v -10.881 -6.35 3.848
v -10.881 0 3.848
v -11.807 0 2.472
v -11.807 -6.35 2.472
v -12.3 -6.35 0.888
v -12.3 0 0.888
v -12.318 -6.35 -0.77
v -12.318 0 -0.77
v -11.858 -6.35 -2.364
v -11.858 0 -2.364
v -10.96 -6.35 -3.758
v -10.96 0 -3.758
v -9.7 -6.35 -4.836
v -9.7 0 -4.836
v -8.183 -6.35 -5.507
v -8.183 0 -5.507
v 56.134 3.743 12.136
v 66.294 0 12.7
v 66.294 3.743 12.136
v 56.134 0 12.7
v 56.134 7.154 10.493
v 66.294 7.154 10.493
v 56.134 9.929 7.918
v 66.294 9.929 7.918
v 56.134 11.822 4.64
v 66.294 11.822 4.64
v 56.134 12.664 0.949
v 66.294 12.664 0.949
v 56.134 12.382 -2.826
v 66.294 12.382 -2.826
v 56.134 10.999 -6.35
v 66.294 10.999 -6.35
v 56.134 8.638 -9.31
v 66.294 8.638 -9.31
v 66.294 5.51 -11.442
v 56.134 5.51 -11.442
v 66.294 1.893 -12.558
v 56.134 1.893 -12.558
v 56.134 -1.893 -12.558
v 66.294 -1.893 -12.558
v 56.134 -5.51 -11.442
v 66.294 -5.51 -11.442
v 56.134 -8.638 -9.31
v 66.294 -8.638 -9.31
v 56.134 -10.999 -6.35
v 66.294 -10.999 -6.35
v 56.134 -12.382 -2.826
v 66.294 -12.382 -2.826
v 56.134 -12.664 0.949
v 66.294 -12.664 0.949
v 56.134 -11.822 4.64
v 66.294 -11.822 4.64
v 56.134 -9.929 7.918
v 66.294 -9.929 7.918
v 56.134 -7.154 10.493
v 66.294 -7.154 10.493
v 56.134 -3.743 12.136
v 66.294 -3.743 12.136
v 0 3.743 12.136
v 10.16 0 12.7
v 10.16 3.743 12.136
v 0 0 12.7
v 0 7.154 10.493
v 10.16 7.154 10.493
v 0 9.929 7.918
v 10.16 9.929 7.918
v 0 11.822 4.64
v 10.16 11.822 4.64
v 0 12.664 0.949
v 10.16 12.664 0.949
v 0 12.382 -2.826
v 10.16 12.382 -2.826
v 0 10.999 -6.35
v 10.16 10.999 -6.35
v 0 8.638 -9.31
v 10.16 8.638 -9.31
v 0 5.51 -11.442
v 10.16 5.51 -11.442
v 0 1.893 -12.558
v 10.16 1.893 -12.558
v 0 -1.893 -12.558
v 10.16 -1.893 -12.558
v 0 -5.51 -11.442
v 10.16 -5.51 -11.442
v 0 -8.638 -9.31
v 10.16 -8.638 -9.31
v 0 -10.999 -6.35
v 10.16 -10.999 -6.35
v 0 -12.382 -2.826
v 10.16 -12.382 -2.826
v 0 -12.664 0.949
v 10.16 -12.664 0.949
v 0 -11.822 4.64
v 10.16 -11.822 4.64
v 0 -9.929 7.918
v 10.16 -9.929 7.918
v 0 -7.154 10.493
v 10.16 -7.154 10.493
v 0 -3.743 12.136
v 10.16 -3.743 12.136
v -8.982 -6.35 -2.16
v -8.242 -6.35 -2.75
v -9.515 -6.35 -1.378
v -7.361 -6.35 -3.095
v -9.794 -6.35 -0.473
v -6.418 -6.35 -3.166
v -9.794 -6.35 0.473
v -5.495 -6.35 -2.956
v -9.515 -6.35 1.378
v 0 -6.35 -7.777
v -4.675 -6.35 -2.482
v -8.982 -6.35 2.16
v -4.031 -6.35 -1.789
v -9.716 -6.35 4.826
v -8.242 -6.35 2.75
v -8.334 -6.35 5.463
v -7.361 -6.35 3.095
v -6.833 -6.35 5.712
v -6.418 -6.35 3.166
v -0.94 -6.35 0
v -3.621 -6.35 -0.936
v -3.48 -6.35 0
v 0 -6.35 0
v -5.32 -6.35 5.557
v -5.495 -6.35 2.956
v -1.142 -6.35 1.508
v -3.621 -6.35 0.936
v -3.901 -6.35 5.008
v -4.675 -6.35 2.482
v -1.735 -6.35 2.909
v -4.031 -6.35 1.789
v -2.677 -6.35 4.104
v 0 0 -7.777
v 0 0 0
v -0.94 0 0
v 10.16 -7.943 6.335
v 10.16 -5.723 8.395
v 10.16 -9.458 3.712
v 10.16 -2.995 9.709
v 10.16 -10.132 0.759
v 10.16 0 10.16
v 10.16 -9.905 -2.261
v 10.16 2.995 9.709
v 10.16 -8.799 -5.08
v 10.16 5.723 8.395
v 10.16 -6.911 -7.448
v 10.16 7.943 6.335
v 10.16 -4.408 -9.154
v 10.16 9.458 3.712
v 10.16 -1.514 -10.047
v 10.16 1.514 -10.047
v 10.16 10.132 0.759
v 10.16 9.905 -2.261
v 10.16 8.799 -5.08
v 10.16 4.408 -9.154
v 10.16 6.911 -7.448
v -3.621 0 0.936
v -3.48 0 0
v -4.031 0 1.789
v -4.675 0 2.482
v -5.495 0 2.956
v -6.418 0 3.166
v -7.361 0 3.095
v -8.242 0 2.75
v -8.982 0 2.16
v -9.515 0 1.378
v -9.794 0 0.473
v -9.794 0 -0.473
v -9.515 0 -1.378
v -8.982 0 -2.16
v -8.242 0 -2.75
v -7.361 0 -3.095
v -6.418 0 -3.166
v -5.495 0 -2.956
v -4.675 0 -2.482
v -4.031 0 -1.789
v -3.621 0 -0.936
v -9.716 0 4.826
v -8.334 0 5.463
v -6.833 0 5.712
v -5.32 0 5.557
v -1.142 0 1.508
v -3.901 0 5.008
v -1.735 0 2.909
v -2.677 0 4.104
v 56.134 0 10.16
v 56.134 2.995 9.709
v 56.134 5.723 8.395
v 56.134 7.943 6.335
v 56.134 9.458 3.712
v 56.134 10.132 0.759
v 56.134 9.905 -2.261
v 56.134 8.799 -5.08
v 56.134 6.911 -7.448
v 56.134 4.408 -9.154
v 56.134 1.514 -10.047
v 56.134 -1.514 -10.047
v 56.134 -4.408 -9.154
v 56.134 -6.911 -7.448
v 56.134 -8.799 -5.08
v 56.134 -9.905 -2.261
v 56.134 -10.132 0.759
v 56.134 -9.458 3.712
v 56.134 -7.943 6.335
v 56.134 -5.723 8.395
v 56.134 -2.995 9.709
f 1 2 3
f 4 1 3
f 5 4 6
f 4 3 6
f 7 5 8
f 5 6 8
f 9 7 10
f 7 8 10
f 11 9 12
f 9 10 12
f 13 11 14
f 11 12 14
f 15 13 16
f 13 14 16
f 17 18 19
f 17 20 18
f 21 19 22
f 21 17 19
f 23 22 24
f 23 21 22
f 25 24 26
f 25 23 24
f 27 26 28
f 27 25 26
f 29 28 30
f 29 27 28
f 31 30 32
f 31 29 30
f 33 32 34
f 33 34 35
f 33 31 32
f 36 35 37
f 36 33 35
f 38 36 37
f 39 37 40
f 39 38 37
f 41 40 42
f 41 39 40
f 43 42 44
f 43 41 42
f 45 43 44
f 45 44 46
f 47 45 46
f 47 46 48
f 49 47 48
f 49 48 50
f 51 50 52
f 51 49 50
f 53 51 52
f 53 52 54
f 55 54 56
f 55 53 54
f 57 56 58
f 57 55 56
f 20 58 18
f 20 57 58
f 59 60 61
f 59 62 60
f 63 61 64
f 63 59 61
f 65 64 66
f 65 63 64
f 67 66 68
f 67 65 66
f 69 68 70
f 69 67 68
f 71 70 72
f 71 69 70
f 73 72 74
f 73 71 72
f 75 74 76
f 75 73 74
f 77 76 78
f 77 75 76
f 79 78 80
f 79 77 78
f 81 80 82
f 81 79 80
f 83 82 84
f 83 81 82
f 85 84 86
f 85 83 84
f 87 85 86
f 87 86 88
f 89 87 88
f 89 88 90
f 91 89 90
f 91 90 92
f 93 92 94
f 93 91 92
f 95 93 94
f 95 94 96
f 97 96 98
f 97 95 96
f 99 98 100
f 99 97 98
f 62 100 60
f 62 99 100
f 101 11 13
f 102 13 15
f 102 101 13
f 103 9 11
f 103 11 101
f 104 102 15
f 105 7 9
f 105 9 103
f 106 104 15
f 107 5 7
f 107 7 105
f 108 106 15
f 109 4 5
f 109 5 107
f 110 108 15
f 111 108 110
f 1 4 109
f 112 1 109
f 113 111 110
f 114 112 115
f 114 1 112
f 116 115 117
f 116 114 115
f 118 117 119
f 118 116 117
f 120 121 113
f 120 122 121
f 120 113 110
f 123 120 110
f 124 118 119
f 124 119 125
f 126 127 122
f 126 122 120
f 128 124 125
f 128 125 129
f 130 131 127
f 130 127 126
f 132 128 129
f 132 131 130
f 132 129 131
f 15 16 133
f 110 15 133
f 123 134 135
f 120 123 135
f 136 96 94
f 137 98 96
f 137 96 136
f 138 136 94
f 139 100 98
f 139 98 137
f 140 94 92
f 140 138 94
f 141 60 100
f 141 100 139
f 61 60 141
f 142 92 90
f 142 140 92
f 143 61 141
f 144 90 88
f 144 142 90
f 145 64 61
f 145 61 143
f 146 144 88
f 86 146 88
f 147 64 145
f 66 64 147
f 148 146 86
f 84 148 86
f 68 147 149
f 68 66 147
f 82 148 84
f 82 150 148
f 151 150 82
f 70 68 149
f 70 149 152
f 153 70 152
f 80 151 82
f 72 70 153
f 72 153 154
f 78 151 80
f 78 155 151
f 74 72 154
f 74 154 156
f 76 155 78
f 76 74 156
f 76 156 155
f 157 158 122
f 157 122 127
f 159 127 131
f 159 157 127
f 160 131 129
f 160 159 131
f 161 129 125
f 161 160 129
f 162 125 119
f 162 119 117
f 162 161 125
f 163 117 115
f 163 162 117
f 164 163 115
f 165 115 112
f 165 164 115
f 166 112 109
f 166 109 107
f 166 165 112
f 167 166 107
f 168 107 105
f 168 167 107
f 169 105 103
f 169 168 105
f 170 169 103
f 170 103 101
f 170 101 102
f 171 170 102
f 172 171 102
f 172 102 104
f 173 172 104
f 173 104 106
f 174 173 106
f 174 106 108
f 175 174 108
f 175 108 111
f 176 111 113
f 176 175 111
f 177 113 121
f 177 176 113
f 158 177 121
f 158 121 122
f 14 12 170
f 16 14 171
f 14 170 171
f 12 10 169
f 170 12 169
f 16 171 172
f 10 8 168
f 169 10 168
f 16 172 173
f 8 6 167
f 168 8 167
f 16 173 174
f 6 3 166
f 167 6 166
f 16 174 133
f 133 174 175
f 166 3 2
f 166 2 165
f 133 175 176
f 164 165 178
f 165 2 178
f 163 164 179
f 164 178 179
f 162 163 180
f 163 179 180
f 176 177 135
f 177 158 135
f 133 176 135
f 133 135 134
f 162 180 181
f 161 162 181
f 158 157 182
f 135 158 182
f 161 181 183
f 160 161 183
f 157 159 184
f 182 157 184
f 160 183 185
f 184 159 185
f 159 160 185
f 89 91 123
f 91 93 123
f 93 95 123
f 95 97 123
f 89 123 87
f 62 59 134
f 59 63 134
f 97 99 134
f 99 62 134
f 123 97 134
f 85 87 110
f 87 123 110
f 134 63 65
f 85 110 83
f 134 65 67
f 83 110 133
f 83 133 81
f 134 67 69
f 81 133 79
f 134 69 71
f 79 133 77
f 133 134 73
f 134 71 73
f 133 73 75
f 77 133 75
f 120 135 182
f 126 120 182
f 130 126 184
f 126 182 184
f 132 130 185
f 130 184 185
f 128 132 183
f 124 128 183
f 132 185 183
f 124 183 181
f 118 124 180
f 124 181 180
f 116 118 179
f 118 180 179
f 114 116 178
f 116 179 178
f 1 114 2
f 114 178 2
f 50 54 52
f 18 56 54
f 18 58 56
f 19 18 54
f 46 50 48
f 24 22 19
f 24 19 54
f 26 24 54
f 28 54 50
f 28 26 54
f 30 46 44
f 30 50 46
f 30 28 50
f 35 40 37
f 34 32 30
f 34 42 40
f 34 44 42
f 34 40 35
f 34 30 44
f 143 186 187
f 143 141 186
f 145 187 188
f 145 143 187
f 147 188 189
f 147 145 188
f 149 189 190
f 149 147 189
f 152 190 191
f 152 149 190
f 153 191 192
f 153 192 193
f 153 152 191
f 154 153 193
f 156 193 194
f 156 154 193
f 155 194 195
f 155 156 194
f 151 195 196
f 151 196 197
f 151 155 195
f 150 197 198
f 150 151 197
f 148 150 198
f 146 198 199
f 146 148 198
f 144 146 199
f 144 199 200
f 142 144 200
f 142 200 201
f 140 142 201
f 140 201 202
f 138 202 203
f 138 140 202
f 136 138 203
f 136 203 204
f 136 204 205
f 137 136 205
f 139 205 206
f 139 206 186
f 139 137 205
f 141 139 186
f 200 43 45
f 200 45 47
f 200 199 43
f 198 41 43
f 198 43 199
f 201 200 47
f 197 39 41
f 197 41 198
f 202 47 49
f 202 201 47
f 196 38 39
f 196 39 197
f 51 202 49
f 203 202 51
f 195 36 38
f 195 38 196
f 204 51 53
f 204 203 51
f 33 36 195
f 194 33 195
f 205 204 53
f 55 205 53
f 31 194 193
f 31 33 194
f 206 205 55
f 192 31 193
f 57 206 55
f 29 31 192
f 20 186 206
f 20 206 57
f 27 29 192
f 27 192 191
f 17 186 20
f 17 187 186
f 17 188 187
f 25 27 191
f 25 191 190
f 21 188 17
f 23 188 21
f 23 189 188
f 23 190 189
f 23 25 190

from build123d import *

# Parameters (mm, degrees)
F0_W     = 5.842
F0_H     = 12.7
F0_R     = 3.175
F3_DEPTH = 6.35


with BuildPart() as f1:
    # F0 (on Front) → F1 (revolve)
    with BuildSketch(Plane.XZ):
        with Locations((2.921, 6.35)):
            Rectangle(F0_W, F0_H)
    revolve(axis=Axis((33.147, 0, 0), (-1, 0, 0)))

    # F0 (on Front) → F2 (revolve)
    with BuildSketch(Plane.XZ):
        Polygon((5.842, 12.7), (5.842, 0), (66.294, 0), (66.294, 12.7), (56.134, 12.7), (56.134, 10.16), (10.16, 10.16), (10.16, 12.7), align=None)
    revolve(axis=Axis((33.147, 0, 0), (-1, 0, 0)))

    # F0 (on Front) → F3 (join)
    with BuildSketch(Plane.XZ):
        with BuildLine():
            ThreePointArc((-8.182663, -5.506983), (-3.195791, -4.549339), (-0.9398, 0))
            ThreePointArc((-0.9398, 0), (-4.591961, 5.329721), (-10.88063, 3.847543))
            ThreePointArc((-10.88063, 3.847543), (-12.145978, -1.583727), (-8.182663, -5.506983))
        make_face()
        with Locations((-6.6548, 0)):
            Circle(F0_R, mode=Mode.SUBTRACT)
        with BuildLine():
            Line((5.842, 0), (0, 0))
            Line((0, 0), (-0.9398, 0))
            ThreePointArc((-0.9398, 0), (-3.195791, -4.549339), (-8.182663, -5.506983))
            Line((-8.182663, -5.506983), (5.842, -9.398))
            Line((5.842, -9.398), (5.842, 0))
        make_face()
    extrude(amount=F3_DEPTH)


solid = f1.part
